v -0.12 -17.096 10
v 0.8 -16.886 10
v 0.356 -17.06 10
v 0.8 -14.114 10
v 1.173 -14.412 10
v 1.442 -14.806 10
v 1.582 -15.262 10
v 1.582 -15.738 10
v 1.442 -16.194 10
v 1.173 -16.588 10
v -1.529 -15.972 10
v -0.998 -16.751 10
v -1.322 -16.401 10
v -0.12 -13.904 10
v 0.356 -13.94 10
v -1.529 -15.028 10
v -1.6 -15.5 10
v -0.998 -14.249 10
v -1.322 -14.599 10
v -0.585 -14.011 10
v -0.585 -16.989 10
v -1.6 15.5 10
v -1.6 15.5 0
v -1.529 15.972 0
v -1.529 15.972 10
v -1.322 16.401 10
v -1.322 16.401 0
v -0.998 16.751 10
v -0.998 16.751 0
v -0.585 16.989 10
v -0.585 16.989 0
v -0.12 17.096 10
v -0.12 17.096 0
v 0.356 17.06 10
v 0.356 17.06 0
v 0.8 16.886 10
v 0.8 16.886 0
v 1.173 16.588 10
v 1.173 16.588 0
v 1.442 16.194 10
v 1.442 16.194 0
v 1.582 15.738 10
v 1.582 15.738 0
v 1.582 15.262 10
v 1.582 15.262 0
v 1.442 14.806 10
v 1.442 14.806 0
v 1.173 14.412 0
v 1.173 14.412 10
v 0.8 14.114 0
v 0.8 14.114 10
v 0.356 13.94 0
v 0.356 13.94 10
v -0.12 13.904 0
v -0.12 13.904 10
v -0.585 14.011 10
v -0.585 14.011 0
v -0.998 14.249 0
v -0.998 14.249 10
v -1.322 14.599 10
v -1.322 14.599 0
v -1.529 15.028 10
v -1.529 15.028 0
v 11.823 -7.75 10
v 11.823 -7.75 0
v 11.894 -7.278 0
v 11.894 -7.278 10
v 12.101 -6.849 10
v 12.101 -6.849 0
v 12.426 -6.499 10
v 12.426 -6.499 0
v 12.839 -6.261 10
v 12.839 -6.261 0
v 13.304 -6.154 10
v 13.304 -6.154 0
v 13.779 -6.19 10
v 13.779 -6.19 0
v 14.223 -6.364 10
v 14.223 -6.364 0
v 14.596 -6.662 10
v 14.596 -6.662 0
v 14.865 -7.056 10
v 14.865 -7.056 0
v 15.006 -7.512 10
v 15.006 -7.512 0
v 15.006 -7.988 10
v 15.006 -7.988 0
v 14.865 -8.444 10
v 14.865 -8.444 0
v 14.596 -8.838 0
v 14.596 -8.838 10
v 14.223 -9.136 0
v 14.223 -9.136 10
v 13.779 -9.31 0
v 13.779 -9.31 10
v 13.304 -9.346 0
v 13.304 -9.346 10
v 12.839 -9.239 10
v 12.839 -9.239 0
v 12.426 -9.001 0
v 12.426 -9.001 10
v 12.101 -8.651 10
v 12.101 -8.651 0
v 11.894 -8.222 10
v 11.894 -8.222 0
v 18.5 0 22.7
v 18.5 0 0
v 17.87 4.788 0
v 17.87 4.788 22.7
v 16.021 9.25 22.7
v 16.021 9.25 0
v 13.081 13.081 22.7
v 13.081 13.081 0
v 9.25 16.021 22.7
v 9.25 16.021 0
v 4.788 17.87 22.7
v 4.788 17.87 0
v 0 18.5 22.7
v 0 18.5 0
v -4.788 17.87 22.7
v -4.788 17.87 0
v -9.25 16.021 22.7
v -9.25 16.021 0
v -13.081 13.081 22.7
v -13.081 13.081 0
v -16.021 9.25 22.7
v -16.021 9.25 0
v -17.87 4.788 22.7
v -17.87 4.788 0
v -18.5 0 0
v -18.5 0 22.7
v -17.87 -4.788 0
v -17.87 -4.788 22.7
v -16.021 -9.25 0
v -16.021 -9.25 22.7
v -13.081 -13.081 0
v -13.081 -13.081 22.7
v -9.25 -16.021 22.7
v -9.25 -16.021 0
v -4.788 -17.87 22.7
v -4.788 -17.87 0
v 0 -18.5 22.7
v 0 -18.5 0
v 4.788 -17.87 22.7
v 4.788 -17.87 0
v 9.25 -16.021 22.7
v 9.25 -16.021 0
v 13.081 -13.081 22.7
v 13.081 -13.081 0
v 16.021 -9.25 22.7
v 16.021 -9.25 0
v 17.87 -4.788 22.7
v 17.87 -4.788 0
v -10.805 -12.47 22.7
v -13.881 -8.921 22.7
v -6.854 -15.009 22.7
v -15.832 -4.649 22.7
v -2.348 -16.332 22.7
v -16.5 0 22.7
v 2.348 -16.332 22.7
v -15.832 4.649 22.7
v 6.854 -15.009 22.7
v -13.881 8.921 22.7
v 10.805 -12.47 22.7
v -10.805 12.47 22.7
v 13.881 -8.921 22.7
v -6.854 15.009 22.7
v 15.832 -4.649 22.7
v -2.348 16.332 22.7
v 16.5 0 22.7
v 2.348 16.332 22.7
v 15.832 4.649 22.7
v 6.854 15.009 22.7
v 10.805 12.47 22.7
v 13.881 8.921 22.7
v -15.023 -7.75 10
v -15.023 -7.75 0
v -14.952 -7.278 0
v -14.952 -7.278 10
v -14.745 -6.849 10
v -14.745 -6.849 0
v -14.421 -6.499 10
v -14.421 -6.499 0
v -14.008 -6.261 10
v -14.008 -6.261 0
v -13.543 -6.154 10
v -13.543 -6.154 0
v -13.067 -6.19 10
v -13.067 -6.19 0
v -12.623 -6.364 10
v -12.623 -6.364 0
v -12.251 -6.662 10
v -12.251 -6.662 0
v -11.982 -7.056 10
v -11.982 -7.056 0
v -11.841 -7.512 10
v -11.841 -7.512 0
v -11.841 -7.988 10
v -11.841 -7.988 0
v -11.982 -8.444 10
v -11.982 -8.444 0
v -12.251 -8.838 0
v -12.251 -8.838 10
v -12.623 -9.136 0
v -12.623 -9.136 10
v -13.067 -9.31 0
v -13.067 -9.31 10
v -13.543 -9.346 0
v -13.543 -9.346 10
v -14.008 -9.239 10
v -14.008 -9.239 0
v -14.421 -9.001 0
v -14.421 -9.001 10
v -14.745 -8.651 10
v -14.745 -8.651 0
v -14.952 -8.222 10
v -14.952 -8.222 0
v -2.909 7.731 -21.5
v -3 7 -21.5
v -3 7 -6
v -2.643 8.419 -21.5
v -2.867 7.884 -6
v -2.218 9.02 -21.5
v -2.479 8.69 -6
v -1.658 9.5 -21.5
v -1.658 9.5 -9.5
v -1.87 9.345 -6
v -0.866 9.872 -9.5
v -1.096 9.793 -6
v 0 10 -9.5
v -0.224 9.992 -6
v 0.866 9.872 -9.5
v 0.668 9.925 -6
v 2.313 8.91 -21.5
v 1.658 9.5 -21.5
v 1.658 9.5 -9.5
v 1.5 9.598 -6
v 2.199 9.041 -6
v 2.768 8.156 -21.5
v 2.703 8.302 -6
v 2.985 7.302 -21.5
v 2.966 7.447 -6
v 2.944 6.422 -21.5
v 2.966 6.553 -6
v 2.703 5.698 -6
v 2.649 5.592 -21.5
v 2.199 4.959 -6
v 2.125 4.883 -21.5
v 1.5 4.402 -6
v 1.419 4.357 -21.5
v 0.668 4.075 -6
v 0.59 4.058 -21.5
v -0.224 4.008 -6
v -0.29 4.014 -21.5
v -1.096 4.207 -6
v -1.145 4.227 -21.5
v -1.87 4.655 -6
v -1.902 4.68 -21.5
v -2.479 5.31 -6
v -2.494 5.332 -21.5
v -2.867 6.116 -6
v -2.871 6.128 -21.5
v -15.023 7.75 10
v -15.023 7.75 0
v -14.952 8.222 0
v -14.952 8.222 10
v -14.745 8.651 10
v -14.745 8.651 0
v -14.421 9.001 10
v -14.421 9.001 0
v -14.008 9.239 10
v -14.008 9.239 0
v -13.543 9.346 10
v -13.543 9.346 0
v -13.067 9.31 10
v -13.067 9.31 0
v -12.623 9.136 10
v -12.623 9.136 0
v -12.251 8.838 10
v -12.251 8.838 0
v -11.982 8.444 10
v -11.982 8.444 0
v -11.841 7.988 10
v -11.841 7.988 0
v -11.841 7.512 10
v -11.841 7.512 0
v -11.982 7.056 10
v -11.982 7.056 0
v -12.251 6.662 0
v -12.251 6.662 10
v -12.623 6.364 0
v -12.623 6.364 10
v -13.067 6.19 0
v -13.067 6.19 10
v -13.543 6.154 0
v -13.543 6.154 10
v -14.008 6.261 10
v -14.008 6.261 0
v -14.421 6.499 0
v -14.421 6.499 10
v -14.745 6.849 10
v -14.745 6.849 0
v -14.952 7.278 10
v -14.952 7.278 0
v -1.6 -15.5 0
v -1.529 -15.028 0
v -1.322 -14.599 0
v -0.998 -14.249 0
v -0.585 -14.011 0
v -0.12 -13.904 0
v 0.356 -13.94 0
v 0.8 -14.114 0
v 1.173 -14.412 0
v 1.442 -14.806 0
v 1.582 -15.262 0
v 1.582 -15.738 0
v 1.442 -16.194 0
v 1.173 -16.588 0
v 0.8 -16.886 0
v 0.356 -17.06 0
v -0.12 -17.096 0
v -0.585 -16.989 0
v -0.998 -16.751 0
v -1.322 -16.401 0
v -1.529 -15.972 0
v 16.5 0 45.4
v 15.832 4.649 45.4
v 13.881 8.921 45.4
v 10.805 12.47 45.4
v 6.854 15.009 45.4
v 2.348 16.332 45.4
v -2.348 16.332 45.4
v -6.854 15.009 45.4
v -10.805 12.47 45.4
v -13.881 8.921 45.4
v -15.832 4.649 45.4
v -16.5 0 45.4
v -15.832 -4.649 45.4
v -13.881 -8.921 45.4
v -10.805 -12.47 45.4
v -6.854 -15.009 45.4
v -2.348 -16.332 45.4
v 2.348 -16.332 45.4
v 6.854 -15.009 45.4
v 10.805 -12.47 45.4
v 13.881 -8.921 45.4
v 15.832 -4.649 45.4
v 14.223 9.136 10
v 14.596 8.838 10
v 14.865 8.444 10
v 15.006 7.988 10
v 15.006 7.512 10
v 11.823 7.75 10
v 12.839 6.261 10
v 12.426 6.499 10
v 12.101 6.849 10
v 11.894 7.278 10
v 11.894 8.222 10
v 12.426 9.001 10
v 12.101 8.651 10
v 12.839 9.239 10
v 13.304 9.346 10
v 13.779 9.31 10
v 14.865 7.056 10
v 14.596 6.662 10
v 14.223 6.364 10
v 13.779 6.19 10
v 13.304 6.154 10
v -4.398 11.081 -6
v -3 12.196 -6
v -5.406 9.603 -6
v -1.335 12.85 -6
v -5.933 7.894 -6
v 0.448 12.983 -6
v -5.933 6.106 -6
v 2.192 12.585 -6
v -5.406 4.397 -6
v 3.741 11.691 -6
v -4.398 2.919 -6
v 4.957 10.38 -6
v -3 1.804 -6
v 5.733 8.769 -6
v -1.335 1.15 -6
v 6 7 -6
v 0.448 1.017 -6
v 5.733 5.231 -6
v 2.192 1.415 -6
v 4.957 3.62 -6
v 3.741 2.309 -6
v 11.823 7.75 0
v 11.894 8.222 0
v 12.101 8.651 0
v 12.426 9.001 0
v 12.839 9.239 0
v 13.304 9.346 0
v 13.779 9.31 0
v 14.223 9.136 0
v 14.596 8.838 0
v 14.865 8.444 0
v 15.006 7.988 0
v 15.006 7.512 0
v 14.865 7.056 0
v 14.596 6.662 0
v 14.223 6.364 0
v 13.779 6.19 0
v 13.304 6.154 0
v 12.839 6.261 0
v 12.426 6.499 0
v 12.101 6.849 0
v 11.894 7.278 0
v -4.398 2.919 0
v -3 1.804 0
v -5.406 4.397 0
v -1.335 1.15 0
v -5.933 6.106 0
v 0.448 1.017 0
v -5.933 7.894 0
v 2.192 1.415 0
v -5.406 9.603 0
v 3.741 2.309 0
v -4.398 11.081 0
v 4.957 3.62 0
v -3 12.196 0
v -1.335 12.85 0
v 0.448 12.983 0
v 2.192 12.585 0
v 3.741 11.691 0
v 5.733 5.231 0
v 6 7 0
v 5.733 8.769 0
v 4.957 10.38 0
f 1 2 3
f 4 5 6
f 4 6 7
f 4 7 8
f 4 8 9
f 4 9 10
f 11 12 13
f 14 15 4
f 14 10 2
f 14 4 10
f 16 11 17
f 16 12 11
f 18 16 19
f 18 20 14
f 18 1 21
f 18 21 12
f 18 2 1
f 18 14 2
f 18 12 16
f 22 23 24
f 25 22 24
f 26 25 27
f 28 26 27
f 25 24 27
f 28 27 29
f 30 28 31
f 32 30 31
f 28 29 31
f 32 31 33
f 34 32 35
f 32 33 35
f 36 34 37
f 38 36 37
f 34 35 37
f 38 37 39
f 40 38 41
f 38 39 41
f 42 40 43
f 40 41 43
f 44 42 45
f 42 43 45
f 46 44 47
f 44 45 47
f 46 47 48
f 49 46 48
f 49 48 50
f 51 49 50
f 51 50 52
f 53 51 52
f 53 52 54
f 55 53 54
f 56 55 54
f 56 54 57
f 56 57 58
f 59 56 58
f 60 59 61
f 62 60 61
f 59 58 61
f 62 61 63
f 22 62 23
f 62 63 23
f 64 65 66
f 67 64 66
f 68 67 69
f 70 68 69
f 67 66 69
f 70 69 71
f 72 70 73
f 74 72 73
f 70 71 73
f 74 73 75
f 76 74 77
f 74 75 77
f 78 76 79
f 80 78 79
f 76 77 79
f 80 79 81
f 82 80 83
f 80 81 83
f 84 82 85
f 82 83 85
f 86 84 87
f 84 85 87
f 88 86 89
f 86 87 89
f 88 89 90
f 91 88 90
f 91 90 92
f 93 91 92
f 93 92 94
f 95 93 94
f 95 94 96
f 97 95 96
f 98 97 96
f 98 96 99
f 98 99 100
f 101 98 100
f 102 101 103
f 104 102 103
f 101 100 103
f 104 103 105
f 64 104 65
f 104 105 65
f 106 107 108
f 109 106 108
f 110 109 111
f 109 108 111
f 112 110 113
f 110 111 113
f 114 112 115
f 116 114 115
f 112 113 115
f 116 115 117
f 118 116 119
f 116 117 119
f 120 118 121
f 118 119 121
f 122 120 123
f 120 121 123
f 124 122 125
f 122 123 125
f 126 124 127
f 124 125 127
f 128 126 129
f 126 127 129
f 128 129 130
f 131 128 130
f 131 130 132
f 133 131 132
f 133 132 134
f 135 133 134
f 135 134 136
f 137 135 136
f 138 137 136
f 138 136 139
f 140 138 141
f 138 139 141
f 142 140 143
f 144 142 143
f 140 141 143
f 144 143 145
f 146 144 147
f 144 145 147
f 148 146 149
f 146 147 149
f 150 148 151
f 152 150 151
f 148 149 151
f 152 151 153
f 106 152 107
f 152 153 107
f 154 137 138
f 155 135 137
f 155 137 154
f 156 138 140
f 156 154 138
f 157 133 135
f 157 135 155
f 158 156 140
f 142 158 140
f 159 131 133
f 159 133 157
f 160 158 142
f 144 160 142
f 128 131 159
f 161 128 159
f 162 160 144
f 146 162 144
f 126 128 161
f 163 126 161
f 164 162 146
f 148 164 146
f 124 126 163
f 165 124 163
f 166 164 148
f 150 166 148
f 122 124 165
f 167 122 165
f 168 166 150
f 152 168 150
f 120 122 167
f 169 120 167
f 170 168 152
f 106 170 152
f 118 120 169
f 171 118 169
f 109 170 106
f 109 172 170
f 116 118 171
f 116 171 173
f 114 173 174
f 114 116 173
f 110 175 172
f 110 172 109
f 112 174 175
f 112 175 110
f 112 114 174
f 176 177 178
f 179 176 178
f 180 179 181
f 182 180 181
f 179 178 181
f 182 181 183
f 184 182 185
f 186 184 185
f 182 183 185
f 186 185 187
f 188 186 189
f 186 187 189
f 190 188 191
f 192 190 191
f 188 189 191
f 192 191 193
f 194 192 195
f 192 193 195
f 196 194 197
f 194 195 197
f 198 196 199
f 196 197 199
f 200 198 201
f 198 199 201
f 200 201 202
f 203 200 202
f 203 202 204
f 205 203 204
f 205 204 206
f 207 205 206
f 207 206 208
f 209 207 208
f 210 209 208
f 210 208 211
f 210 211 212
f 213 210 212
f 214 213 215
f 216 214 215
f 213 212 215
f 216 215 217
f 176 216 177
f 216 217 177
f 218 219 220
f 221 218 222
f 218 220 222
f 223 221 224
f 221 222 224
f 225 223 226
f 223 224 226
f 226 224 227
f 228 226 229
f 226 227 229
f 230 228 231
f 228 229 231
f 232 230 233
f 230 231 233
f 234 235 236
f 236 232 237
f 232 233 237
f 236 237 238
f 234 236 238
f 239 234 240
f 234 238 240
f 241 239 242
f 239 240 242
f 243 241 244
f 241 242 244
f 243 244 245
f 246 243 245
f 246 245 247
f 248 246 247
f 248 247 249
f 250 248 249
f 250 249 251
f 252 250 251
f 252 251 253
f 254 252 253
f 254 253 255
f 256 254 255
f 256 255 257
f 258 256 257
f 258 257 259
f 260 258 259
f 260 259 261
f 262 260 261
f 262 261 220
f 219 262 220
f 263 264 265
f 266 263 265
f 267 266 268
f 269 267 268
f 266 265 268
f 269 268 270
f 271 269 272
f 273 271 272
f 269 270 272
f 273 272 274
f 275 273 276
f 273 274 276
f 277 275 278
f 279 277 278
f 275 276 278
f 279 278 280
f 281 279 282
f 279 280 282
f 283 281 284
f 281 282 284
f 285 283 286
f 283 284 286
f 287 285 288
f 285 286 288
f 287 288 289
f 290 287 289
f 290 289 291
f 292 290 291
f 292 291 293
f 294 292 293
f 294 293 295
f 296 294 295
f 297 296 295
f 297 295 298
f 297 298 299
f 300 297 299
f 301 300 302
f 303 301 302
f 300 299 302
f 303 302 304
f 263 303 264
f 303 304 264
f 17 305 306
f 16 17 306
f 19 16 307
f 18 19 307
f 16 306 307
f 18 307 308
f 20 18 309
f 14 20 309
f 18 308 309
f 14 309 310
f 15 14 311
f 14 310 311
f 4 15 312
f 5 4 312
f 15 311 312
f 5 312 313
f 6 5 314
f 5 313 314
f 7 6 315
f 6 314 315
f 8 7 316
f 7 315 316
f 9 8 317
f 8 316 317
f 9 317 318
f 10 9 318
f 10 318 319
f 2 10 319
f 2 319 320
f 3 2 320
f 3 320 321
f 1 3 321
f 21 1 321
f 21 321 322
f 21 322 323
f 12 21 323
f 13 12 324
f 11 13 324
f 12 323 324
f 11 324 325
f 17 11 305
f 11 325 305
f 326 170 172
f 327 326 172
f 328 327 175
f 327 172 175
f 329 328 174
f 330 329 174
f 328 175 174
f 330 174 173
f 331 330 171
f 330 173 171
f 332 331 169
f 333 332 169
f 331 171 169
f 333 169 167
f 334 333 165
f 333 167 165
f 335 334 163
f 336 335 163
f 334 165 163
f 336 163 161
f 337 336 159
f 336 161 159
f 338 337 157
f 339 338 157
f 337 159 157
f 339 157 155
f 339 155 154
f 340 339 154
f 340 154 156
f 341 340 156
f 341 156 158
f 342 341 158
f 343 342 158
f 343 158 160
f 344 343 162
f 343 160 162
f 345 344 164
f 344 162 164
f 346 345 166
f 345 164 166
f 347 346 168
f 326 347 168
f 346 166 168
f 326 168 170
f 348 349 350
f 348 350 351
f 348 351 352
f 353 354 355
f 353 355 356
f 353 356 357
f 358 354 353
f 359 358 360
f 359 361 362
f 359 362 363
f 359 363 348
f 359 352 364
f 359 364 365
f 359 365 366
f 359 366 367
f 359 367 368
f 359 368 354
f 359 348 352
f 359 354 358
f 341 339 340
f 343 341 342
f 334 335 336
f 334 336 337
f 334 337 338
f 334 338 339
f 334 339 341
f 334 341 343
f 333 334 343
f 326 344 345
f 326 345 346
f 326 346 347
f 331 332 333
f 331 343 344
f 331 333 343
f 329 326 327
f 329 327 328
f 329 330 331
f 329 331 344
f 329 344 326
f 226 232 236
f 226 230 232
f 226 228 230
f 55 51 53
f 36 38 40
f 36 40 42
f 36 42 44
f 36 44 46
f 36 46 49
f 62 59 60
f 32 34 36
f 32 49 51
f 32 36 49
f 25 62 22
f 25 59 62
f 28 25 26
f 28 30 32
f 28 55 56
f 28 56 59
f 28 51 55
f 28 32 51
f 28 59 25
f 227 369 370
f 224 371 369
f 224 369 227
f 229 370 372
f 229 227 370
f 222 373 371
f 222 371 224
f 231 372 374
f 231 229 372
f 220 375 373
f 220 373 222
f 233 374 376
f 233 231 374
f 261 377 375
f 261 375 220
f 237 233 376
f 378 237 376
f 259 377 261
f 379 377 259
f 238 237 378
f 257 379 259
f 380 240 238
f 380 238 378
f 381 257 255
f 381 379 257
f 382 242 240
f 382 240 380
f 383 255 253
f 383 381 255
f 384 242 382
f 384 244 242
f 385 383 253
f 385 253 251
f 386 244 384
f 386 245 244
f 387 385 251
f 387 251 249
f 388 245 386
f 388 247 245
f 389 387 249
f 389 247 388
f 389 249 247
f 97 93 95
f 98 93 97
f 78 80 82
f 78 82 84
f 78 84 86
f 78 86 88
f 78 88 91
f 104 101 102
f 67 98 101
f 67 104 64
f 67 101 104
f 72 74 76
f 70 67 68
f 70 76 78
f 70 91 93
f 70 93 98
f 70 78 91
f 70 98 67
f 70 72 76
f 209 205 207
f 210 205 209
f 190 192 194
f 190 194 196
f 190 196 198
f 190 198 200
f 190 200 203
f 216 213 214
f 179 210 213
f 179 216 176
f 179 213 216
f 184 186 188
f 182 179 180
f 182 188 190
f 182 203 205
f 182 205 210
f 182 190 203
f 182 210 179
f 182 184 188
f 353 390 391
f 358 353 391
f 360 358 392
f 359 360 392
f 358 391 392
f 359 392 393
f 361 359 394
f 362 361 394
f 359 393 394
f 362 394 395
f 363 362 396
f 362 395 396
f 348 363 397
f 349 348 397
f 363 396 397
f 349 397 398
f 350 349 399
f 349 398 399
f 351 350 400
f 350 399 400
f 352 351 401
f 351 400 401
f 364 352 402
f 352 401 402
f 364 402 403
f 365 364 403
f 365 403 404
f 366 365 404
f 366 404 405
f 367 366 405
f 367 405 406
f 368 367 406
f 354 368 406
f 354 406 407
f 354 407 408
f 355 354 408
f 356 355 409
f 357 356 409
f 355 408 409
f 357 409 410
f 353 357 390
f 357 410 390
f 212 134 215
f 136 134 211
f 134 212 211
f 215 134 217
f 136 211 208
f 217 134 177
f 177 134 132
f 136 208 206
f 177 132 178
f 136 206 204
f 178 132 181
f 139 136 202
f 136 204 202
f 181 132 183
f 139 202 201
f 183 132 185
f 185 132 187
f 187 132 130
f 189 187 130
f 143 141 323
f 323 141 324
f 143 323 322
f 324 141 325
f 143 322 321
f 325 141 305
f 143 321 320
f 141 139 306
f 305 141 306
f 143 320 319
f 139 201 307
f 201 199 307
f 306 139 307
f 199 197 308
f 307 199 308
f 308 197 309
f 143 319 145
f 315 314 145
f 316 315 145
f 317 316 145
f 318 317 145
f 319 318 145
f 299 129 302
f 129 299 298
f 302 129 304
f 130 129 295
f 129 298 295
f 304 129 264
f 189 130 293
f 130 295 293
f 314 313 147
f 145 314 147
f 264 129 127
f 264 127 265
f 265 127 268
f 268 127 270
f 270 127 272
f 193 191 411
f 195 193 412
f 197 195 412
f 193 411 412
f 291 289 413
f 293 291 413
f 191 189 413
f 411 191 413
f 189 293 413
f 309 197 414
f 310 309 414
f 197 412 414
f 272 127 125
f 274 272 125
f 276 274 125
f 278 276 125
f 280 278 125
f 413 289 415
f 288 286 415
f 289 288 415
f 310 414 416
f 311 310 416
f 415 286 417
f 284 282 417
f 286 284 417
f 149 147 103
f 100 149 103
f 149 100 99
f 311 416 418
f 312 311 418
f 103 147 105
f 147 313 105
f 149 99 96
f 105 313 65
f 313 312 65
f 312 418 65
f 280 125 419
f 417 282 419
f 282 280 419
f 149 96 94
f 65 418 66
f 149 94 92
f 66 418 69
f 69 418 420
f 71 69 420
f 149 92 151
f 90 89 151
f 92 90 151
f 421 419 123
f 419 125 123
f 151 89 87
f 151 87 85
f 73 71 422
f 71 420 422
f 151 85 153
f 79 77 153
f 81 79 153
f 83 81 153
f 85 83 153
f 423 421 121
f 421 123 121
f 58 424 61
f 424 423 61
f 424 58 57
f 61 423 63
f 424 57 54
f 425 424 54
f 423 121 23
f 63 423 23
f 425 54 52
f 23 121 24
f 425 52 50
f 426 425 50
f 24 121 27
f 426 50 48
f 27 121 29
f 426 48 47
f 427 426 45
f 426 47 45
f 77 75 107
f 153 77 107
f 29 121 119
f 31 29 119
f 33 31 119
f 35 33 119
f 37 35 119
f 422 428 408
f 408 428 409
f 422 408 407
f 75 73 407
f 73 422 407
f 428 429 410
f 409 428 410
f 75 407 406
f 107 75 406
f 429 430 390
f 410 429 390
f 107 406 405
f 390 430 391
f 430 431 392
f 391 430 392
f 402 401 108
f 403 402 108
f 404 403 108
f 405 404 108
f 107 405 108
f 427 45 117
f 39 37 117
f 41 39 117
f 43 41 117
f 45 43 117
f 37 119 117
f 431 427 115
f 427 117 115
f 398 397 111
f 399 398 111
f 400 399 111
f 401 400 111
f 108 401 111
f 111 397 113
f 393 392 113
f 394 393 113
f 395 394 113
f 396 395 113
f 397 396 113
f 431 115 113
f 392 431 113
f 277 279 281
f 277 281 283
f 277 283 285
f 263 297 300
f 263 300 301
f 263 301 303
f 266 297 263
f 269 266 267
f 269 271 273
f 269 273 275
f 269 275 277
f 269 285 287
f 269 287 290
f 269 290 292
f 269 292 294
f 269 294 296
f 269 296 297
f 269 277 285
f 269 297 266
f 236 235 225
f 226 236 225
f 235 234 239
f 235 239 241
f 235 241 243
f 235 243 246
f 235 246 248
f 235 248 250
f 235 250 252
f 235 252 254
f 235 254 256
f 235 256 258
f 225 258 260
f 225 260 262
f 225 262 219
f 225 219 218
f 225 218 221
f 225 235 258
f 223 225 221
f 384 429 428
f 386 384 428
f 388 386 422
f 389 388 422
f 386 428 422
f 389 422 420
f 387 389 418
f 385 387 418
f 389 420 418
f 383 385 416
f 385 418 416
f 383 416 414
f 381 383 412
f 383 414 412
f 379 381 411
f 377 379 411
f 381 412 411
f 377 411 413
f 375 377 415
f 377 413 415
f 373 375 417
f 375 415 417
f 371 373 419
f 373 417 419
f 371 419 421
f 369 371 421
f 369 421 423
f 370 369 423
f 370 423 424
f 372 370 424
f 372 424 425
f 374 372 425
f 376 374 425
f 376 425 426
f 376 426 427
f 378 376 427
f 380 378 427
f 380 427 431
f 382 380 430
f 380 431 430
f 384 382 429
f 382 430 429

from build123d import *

# Parameters (mm, degrees)
SKETCH_1_R          = 18.5
EXTRUDE_1_DEPTH     = 22.7
SKETCH_2_R          = 16.5
EXTRUDE_2_DEPTH     = 22.7
SKETCH_3_R          = 6
EXTRUDE_3_DEPTH     = 6
SKETCH_4_R          = 3
EXTRUDE_4_DEPTH     = 15.5
SKETCH_5_W          = 14.350775589
SKETCH_5_H          = 3.642889188
CUT_EXTRUDE_1_DEPTH = 12
SKETCH_6_R          = 1.6
CUT_EXTRUDE_2_DEPTH = 10


with BuildPart() as part:
    # 草图1 → 凸台-拉伸1 (new body)
    with BuildSketch(Plane.XY):
        Circle(SKETCH_1_R)
    extrude(amount=EXTRUDE_1_DEPTH)

    # 草图2 → 凸台-拉伸2 (add)
    with BuildSketch(Plane.XY.offset(22.7)):
        Circle(SKETCH_2_R)
    extrude(amount=EXTRUDE_2_DEPTH)

    # 草图3 → 凸台-拉伸3 (add)
    with BuildSketch(Plane(origin=(0, 0, 0), x_dir=(-1, 0, 0), z_dir=(0, 0, -1))):
        with Locations(Location((0, 7, 0), (0, 0, 180))):
            Circle(SKETCH_3_R)
    extrude(amount=EXTRUDE_3_DEPTH)

    # 草图4 → 凸台-拉伸4 (add)
    with BuildSketch(Plane(origin=(0, 0, -6), x_dir=(-1, 0, 0), z_dir=(0, 0, -1))):
        with Locations((0, 7)):
            Circle(SKETCH_4_R)
    extrude(amount=EXTRUDE_4_DEPTH)

    # 草图5 → 切除-拉伸1 (cut)
    with BuildSketch(Plane(origin=(0, 0, -21.5), x_dir=(-1, 0, 0), z_dir=(0, 0, -1))):
        with Locations((0.938319943, 11.321444594)):
            Rectangle(SKETCH_5_W, SKETCH_5_H)
    extrude(amount=-CUT_EXTRUDE_1_DEPTH, mode=Mode.SUBTRACT)

    # 草图6 → 切除-拉伸2 (cut)
    with BuildSketch(Plane(origin=(0, 0, 0), x_dir=(-1, 0, 0), z_dir=(0, 0, -1))):
        with Locations((0, 15.5)):
            Circle(SKETCH_6_R)
        with Locations((13.423393759, 7.75)):
            Circle(SKETCH_6_R)
        with Locations((13.423393759, -7.75)):
            Circle(SKETCH_6_R)
        with Locations((0, -15.5)):
            Circle(SKETCH_6_R)
        with Locations((-13.423393759, -7.75)):
            Circle(SKETCH_6_R)
        with Locations((-13.423393759, 7.75)):
            Circle(SKETCH_6_R)
    extrude(amount=-CUT_EXTRUDE_2_DEPTH, mode=Mode.SUBTRACT)


solid = part.part
